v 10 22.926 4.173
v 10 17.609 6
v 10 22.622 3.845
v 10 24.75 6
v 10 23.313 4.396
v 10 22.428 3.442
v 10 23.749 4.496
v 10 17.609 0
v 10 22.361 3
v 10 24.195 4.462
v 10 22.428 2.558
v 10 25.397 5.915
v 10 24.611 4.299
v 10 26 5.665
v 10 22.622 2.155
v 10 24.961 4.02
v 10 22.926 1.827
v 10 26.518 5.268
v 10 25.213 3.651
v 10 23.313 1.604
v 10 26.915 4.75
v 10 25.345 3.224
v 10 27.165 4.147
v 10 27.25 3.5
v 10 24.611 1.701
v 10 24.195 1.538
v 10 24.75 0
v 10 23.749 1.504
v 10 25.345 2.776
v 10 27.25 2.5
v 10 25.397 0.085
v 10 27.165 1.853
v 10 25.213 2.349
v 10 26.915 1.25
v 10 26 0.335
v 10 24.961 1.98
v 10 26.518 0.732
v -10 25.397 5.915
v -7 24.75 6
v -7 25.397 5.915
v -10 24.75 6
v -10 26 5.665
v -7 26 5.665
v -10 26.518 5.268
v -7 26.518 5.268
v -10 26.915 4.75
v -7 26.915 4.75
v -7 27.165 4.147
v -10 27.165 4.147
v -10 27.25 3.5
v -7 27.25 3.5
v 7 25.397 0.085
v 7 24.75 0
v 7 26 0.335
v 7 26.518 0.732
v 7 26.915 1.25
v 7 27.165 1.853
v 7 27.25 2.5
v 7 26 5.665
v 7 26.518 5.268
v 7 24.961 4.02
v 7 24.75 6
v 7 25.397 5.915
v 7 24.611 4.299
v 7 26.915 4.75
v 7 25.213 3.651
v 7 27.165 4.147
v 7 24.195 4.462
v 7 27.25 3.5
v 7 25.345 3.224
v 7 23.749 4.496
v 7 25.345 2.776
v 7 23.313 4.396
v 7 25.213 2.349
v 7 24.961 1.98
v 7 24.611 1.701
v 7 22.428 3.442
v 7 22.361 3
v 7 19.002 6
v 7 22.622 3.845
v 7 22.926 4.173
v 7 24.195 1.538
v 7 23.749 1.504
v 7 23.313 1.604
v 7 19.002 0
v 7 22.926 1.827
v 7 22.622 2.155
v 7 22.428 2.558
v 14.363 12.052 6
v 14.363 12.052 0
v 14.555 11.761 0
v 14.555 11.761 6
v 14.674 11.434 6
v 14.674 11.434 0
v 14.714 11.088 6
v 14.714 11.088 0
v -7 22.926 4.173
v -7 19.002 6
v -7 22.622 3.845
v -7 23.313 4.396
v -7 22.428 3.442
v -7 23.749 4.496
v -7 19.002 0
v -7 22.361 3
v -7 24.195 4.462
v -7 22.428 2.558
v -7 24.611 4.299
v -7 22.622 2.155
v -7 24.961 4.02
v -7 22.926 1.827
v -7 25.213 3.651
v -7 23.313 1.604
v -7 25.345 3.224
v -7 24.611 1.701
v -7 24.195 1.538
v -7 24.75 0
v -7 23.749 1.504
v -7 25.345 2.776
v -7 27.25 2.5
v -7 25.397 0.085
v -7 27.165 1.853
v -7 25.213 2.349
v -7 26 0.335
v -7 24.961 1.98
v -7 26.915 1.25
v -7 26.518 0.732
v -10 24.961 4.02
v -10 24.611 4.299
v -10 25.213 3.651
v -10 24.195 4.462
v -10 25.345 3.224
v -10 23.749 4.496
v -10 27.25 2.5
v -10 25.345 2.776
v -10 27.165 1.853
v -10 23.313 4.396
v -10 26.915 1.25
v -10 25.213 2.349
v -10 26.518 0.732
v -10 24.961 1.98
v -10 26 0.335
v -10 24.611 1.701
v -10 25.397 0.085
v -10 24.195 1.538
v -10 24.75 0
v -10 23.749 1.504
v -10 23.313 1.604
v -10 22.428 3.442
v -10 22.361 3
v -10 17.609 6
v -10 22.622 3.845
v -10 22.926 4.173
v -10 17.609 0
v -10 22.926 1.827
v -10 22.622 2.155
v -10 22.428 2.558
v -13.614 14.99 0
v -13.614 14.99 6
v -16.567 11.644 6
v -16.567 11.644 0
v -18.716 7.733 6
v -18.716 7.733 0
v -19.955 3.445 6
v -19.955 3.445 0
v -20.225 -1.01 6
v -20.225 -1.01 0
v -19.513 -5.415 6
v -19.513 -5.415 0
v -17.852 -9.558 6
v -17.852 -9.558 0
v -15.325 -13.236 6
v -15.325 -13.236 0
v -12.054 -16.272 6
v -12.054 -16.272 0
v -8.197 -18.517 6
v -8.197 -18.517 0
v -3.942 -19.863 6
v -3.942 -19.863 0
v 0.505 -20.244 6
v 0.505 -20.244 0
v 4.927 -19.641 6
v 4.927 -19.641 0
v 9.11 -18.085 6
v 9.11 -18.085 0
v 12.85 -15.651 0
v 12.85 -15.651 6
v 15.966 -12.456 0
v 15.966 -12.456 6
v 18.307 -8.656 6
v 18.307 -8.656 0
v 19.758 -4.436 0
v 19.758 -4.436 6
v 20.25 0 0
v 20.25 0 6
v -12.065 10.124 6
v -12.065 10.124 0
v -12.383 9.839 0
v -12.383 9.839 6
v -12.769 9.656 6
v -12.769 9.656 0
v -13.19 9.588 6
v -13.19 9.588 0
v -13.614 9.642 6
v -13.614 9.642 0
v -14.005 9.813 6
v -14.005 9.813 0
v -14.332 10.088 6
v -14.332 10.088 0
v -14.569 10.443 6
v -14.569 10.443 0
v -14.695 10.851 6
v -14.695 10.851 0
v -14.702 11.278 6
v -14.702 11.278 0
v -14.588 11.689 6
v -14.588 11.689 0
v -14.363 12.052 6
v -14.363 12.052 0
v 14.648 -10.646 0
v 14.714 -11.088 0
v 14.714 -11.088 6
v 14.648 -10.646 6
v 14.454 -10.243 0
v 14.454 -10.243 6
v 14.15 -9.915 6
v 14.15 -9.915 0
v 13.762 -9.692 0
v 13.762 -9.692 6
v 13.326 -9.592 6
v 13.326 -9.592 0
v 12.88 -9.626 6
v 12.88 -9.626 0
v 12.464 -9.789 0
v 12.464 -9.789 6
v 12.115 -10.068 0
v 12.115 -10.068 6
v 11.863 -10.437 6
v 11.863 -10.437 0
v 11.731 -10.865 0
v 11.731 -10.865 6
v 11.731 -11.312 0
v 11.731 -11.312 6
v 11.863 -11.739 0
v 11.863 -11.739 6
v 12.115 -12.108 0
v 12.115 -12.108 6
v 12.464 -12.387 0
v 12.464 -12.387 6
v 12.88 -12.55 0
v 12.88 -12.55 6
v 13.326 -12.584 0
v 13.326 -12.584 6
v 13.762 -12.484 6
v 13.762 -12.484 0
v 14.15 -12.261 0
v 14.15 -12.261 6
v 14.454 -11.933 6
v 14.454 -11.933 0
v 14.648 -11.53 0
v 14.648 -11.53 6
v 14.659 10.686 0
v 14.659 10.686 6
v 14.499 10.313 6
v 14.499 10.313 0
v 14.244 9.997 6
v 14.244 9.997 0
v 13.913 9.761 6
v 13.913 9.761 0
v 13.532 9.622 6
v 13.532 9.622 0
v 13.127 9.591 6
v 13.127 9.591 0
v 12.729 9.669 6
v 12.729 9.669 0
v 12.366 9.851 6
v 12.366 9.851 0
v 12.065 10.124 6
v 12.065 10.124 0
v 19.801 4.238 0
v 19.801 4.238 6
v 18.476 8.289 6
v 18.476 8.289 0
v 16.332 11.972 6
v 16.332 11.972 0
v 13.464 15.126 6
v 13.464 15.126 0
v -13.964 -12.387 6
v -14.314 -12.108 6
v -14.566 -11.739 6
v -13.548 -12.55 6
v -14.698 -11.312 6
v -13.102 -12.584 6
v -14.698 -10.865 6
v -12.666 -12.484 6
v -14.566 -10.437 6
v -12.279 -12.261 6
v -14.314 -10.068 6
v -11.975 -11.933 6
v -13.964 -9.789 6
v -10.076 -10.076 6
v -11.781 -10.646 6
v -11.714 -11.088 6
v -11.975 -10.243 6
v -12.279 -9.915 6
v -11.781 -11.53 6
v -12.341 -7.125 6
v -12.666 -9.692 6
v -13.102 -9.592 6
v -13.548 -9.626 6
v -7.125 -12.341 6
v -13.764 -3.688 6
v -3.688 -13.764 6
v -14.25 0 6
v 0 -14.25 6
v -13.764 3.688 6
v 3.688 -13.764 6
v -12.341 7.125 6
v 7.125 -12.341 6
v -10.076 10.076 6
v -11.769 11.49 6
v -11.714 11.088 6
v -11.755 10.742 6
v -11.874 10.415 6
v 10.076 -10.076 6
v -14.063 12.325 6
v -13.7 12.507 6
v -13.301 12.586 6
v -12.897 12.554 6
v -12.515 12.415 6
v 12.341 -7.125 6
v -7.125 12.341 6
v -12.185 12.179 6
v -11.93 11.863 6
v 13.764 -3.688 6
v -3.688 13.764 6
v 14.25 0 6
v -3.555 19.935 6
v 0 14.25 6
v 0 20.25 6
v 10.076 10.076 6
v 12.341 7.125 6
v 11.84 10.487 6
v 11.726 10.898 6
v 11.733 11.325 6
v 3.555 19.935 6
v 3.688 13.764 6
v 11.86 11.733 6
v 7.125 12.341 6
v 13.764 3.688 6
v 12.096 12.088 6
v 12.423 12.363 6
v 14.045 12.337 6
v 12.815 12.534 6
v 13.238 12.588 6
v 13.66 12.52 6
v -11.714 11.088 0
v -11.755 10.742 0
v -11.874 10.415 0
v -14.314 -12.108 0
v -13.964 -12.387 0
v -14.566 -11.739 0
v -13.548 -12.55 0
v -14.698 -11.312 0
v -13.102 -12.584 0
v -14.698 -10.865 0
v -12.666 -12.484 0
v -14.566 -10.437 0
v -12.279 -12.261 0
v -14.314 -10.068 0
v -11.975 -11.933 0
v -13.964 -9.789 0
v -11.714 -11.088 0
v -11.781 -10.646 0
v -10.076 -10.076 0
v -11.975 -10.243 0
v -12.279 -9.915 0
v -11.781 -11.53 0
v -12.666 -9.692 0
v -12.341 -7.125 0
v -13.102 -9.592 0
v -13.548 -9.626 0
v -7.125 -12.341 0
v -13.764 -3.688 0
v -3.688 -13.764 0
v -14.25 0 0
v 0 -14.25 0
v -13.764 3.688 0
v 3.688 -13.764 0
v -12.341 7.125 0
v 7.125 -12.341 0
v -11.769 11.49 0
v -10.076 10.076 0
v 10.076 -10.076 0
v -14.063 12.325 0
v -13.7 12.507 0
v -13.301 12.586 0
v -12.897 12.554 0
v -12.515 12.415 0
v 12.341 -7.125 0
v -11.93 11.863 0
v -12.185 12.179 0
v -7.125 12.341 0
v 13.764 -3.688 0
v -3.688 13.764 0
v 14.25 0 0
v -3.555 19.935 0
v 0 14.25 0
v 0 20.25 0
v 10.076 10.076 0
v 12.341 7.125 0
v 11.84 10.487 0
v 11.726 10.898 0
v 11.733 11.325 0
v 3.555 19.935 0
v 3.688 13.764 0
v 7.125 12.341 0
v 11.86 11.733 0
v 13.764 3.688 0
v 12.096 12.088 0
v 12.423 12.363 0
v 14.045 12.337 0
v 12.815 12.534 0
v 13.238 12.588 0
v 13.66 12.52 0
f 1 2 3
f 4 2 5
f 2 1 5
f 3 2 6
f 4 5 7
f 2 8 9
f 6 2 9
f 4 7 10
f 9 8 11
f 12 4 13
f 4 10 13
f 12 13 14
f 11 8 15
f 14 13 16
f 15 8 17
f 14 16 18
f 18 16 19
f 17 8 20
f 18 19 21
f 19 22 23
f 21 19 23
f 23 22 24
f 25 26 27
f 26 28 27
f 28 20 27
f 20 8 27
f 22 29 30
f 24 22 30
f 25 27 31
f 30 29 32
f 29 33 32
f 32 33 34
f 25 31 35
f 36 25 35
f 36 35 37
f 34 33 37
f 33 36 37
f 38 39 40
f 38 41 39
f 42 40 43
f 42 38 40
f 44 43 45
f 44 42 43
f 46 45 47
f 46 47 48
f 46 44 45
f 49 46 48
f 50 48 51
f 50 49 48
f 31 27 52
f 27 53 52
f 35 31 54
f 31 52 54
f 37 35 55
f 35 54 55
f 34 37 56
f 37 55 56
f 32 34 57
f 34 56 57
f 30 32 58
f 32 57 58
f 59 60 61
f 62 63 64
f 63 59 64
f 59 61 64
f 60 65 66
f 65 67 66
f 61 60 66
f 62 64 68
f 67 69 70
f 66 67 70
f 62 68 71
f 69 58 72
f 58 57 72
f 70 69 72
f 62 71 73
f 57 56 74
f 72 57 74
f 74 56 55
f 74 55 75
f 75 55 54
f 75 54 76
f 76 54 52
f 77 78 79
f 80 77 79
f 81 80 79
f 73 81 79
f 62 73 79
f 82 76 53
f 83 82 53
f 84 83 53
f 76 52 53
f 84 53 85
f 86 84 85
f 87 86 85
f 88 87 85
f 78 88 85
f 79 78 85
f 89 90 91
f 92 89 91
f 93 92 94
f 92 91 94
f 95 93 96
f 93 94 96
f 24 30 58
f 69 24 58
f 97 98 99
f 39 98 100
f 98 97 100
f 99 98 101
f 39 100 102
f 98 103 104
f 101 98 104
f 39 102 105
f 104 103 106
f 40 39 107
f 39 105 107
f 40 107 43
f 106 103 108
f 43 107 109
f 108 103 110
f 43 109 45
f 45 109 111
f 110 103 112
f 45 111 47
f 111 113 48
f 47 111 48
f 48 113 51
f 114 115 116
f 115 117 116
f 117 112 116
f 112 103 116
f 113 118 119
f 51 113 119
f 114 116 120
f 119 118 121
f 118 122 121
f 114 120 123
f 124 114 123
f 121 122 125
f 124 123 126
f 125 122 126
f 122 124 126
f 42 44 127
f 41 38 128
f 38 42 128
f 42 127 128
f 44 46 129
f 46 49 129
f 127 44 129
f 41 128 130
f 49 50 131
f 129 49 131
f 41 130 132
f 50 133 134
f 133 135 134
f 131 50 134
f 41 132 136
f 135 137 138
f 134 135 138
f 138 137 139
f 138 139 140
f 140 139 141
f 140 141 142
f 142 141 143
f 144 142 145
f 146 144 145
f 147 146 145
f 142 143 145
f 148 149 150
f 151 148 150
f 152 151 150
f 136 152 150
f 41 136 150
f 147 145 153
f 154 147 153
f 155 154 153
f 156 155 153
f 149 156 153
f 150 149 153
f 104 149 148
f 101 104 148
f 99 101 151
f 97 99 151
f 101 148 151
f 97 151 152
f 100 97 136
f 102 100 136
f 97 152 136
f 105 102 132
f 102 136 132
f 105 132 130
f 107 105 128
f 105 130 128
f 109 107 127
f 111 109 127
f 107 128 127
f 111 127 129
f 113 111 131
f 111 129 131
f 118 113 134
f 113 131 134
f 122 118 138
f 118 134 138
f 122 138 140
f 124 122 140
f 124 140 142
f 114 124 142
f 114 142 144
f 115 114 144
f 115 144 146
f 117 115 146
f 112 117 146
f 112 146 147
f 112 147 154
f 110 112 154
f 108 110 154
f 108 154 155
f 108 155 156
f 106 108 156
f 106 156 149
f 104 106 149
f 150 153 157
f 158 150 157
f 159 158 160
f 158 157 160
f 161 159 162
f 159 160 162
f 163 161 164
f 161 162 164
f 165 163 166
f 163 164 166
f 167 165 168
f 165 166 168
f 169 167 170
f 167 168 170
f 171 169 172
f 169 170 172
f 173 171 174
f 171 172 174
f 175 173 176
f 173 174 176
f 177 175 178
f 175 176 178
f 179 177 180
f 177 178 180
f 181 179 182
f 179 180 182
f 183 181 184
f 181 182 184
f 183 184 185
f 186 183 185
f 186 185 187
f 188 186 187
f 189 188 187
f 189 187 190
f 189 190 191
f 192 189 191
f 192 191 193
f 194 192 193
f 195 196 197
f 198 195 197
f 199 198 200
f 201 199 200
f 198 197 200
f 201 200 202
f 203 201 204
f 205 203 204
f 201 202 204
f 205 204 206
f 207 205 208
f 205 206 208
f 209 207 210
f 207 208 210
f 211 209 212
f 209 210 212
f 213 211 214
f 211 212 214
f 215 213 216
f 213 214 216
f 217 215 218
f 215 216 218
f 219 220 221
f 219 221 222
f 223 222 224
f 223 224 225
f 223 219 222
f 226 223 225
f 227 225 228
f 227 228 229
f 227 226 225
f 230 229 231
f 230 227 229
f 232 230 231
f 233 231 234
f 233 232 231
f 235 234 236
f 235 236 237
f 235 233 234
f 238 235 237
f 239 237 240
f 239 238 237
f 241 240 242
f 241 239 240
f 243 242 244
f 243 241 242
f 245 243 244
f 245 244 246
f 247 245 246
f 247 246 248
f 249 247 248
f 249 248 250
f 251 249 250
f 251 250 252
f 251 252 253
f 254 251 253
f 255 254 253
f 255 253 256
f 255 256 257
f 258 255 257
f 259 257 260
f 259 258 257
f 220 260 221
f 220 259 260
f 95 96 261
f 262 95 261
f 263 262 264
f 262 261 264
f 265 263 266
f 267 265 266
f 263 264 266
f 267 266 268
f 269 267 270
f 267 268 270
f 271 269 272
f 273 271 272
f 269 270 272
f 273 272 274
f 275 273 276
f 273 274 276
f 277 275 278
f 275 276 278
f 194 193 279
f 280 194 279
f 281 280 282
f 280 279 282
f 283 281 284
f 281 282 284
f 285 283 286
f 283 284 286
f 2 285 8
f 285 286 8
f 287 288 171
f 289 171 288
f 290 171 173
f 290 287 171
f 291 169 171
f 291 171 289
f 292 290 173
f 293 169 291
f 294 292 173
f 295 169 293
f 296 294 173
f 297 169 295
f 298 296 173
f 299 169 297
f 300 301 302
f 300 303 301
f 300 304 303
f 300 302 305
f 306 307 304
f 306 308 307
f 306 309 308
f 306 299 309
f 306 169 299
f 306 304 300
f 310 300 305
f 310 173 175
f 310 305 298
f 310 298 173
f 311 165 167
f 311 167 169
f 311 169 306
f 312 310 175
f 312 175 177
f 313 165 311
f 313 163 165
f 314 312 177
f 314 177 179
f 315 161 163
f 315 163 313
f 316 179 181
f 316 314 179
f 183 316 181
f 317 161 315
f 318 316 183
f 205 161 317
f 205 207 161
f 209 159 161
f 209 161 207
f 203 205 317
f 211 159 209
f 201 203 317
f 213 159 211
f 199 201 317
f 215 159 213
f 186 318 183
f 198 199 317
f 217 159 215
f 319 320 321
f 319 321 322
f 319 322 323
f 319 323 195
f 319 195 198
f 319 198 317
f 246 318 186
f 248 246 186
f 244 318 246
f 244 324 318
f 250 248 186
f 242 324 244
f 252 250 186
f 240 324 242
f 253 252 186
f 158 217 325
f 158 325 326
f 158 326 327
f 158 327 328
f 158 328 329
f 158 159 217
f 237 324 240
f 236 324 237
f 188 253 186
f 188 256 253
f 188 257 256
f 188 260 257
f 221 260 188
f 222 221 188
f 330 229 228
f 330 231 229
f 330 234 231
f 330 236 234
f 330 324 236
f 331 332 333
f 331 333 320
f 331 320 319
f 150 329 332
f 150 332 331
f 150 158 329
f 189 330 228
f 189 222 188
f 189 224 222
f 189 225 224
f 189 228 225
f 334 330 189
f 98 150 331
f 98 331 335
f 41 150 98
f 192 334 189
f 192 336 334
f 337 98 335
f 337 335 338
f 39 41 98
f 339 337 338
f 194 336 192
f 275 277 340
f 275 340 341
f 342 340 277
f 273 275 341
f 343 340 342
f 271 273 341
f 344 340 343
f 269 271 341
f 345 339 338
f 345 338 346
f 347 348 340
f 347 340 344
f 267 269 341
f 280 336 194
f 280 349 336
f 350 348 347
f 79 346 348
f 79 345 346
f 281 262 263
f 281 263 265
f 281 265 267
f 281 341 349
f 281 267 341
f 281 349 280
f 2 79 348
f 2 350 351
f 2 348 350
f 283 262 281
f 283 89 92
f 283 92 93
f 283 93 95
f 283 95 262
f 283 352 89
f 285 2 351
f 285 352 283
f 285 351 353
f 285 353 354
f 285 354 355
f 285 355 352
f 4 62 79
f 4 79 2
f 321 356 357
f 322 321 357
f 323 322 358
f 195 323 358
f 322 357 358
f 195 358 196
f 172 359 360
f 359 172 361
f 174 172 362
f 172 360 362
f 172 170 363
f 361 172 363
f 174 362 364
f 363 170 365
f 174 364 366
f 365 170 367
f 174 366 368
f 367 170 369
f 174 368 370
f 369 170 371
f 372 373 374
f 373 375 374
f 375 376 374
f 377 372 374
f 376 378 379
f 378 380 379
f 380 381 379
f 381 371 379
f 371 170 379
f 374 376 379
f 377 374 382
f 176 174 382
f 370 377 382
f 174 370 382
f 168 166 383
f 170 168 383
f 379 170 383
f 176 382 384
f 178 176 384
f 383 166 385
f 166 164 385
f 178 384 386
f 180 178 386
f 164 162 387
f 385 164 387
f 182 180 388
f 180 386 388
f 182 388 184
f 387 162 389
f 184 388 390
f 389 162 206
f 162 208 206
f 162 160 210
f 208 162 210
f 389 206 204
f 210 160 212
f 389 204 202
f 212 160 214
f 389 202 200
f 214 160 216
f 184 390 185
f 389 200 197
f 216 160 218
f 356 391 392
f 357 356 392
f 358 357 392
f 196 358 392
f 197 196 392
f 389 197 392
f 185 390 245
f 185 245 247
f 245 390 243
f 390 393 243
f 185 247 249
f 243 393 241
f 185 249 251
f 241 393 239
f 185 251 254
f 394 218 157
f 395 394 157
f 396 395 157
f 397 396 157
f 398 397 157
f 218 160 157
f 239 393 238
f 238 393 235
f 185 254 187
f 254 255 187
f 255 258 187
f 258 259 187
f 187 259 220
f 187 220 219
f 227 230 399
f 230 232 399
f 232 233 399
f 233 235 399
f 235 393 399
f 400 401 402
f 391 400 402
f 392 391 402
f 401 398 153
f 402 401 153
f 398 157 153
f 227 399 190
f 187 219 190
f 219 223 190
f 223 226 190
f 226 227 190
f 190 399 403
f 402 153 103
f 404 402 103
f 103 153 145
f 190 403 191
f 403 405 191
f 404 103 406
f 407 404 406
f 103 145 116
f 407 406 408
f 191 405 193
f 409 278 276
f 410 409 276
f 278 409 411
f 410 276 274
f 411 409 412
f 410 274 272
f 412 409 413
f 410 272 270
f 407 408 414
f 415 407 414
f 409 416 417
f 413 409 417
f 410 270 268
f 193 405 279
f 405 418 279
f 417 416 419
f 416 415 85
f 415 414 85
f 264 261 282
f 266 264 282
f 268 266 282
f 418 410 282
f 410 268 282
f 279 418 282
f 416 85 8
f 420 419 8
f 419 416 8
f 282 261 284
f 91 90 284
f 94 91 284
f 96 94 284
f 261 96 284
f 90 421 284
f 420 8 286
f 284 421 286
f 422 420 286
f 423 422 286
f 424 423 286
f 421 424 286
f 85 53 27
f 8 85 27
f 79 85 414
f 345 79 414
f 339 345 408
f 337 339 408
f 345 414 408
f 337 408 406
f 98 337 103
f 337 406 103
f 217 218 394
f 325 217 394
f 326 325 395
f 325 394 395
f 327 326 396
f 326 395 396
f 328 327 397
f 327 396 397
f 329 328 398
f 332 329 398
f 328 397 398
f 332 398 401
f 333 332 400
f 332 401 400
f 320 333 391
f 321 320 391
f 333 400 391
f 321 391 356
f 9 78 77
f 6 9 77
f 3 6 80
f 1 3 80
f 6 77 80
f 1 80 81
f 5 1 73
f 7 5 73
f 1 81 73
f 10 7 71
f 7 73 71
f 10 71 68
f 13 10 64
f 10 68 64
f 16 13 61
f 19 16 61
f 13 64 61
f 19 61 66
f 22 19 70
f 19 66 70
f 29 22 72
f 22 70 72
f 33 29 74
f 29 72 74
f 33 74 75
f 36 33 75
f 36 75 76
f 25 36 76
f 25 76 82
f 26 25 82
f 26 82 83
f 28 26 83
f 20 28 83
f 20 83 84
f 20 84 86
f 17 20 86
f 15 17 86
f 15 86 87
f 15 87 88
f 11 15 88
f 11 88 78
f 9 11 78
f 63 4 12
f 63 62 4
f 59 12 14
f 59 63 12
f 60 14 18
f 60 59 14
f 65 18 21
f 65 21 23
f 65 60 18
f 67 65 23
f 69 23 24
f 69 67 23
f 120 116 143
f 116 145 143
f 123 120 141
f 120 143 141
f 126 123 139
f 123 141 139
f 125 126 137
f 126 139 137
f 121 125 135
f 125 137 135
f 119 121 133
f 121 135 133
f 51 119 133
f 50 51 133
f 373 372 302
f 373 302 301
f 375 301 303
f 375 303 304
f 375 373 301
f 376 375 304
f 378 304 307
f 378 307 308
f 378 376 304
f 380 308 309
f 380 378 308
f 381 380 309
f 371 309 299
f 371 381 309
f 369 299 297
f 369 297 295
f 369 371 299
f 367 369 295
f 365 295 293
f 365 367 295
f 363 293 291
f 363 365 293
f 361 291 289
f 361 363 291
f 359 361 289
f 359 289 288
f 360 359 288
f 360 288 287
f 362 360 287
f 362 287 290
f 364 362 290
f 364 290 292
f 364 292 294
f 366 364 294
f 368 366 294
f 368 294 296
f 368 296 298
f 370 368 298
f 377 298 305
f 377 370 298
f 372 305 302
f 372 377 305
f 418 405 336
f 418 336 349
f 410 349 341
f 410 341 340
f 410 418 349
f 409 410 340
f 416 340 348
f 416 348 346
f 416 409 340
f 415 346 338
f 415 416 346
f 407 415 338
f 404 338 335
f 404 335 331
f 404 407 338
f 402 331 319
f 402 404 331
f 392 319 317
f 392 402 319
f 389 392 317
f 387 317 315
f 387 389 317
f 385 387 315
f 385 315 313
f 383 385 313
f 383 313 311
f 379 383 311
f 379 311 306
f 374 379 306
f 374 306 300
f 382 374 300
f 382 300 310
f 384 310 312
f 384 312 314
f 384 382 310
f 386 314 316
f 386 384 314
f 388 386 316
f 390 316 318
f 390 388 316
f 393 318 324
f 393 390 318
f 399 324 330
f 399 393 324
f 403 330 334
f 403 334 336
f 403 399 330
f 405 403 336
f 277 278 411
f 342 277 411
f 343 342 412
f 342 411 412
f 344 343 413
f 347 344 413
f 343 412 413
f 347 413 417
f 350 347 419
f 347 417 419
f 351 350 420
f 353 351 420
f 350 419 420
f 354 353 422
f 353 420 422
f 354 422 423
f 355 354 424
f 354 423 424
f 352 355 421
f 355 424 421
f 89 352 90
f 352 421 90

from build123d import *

# Parameters (mm, degrees)
F0_R     = 1.5
F0_R_2   = 14.25
F1_DEPTH = 6
F2_R     = 1.5
F3_DEPTH = 30.251
F4_R     = 2.5


with BuildPart() as f1:
    # F0 (on Top) → F1 (new body)
    with BuildSketch(Plane.XY):
        with BuildLine():
            ThreePointArc((-10, 17.608592), (-10.187308, -17.500893), (20.25, 0))
            ThreePointArc((20.25, 0), (17.500893, 10.187308), (10, 17.608592))
            ThreePointArc((10, 17.608592), (8.52849, 18.366474), (7, 19.001645))
            ThreePointArc((7, 19.001645), (0, 20.25), (-7, 19.001645))
            ThreePointArc((-7, 19.001645), (-8.52849, 18.366474), (-10, 17.608592))
        make_face()
        with Locations((-13.214267, -11.088086)):
            Circle(F0_R, mode=Mode.SUBTRACT)
        with Locations((13.214267, -11.088086)):
            Circle(F0_R, mode=Mode.SUBTRACT)
        Circle(F0_R_2, mode=Mode.SUBTRACT)
        with BuildLine():
            ThreePointArc((-11.714267, 11.088086), (-11.804728, 10.575056), (-12.0652, 10.123905))
            ThreePointArc((-12.0652, 10.123905), (-14.178448, 9.93902), (-14.363333, 12.052268))
            ThreePointArc((-14.363333, 12.052268), (-12.701236, 12.497625), (-11.714267, 11.088086))
        make_face(mode=Mode.SUBTRACT)
        with BuildLine():
            ThreePointArc((14.714267, 11.088086), (13.727297, 9.678547), (12.0652, 10.123905))
            ThreePointArc((12.0652, 10.123905), (12.250085, 12.237153), (14.363333, 12.052268))
            ThreePointArc((14.363333, 12.052268), (14.623806, 11.601116), (14.714267, 11.088086))
        make_face(mode=Mode.SUBTRACT)
        with BuildLine():
            ThreePointArc((7, 19.001645), (8.52849, 18.366474), (10, 17.608592))
            Line((10, 17.608592), (10, 27.25))
            Line((10, 27.25), (7, 27.25))
            Line((7, 27.25), (7, 19.001645))
        make_face()
        with BuildLine():
            Line((-10, 27.25), (-10, 17.608592))
            ThreePointArc((-10, 17.608592), (-8.52849, 18.366474), (-7, 19.001645))
            Line((-7, 19.001645), (-7, 27.25))
            Line((-7, 27.25), (-10, 27.25))
        make_face()
    extrude(amount=F1_DEPTH)

    # F2 (on face) → F3 (cut, through all)
    with BuildSketch(Plane(origin=(-10, 0, 0), x_dir=(0, -1, 0), z_dir=(-1, 0, 0))):
        with Locations((-23.861416, 3)):
            Circle(F2_R)
    extrude(amount=-F3_DEPTH, mode=Mode.SUBTRACT)

    # F4
    f4_edges = [f1.edges().sort_by_distance(p)[0] for p in [
        (8.5, 27.25, 6),
        (8.5, 27.25, 0),
        (-8.5, 27.25, 0),
        (-8.5, 27.25, 6),
    ]]
    fillet(f4_edges, radius=F4_R)


solid = f1.part
